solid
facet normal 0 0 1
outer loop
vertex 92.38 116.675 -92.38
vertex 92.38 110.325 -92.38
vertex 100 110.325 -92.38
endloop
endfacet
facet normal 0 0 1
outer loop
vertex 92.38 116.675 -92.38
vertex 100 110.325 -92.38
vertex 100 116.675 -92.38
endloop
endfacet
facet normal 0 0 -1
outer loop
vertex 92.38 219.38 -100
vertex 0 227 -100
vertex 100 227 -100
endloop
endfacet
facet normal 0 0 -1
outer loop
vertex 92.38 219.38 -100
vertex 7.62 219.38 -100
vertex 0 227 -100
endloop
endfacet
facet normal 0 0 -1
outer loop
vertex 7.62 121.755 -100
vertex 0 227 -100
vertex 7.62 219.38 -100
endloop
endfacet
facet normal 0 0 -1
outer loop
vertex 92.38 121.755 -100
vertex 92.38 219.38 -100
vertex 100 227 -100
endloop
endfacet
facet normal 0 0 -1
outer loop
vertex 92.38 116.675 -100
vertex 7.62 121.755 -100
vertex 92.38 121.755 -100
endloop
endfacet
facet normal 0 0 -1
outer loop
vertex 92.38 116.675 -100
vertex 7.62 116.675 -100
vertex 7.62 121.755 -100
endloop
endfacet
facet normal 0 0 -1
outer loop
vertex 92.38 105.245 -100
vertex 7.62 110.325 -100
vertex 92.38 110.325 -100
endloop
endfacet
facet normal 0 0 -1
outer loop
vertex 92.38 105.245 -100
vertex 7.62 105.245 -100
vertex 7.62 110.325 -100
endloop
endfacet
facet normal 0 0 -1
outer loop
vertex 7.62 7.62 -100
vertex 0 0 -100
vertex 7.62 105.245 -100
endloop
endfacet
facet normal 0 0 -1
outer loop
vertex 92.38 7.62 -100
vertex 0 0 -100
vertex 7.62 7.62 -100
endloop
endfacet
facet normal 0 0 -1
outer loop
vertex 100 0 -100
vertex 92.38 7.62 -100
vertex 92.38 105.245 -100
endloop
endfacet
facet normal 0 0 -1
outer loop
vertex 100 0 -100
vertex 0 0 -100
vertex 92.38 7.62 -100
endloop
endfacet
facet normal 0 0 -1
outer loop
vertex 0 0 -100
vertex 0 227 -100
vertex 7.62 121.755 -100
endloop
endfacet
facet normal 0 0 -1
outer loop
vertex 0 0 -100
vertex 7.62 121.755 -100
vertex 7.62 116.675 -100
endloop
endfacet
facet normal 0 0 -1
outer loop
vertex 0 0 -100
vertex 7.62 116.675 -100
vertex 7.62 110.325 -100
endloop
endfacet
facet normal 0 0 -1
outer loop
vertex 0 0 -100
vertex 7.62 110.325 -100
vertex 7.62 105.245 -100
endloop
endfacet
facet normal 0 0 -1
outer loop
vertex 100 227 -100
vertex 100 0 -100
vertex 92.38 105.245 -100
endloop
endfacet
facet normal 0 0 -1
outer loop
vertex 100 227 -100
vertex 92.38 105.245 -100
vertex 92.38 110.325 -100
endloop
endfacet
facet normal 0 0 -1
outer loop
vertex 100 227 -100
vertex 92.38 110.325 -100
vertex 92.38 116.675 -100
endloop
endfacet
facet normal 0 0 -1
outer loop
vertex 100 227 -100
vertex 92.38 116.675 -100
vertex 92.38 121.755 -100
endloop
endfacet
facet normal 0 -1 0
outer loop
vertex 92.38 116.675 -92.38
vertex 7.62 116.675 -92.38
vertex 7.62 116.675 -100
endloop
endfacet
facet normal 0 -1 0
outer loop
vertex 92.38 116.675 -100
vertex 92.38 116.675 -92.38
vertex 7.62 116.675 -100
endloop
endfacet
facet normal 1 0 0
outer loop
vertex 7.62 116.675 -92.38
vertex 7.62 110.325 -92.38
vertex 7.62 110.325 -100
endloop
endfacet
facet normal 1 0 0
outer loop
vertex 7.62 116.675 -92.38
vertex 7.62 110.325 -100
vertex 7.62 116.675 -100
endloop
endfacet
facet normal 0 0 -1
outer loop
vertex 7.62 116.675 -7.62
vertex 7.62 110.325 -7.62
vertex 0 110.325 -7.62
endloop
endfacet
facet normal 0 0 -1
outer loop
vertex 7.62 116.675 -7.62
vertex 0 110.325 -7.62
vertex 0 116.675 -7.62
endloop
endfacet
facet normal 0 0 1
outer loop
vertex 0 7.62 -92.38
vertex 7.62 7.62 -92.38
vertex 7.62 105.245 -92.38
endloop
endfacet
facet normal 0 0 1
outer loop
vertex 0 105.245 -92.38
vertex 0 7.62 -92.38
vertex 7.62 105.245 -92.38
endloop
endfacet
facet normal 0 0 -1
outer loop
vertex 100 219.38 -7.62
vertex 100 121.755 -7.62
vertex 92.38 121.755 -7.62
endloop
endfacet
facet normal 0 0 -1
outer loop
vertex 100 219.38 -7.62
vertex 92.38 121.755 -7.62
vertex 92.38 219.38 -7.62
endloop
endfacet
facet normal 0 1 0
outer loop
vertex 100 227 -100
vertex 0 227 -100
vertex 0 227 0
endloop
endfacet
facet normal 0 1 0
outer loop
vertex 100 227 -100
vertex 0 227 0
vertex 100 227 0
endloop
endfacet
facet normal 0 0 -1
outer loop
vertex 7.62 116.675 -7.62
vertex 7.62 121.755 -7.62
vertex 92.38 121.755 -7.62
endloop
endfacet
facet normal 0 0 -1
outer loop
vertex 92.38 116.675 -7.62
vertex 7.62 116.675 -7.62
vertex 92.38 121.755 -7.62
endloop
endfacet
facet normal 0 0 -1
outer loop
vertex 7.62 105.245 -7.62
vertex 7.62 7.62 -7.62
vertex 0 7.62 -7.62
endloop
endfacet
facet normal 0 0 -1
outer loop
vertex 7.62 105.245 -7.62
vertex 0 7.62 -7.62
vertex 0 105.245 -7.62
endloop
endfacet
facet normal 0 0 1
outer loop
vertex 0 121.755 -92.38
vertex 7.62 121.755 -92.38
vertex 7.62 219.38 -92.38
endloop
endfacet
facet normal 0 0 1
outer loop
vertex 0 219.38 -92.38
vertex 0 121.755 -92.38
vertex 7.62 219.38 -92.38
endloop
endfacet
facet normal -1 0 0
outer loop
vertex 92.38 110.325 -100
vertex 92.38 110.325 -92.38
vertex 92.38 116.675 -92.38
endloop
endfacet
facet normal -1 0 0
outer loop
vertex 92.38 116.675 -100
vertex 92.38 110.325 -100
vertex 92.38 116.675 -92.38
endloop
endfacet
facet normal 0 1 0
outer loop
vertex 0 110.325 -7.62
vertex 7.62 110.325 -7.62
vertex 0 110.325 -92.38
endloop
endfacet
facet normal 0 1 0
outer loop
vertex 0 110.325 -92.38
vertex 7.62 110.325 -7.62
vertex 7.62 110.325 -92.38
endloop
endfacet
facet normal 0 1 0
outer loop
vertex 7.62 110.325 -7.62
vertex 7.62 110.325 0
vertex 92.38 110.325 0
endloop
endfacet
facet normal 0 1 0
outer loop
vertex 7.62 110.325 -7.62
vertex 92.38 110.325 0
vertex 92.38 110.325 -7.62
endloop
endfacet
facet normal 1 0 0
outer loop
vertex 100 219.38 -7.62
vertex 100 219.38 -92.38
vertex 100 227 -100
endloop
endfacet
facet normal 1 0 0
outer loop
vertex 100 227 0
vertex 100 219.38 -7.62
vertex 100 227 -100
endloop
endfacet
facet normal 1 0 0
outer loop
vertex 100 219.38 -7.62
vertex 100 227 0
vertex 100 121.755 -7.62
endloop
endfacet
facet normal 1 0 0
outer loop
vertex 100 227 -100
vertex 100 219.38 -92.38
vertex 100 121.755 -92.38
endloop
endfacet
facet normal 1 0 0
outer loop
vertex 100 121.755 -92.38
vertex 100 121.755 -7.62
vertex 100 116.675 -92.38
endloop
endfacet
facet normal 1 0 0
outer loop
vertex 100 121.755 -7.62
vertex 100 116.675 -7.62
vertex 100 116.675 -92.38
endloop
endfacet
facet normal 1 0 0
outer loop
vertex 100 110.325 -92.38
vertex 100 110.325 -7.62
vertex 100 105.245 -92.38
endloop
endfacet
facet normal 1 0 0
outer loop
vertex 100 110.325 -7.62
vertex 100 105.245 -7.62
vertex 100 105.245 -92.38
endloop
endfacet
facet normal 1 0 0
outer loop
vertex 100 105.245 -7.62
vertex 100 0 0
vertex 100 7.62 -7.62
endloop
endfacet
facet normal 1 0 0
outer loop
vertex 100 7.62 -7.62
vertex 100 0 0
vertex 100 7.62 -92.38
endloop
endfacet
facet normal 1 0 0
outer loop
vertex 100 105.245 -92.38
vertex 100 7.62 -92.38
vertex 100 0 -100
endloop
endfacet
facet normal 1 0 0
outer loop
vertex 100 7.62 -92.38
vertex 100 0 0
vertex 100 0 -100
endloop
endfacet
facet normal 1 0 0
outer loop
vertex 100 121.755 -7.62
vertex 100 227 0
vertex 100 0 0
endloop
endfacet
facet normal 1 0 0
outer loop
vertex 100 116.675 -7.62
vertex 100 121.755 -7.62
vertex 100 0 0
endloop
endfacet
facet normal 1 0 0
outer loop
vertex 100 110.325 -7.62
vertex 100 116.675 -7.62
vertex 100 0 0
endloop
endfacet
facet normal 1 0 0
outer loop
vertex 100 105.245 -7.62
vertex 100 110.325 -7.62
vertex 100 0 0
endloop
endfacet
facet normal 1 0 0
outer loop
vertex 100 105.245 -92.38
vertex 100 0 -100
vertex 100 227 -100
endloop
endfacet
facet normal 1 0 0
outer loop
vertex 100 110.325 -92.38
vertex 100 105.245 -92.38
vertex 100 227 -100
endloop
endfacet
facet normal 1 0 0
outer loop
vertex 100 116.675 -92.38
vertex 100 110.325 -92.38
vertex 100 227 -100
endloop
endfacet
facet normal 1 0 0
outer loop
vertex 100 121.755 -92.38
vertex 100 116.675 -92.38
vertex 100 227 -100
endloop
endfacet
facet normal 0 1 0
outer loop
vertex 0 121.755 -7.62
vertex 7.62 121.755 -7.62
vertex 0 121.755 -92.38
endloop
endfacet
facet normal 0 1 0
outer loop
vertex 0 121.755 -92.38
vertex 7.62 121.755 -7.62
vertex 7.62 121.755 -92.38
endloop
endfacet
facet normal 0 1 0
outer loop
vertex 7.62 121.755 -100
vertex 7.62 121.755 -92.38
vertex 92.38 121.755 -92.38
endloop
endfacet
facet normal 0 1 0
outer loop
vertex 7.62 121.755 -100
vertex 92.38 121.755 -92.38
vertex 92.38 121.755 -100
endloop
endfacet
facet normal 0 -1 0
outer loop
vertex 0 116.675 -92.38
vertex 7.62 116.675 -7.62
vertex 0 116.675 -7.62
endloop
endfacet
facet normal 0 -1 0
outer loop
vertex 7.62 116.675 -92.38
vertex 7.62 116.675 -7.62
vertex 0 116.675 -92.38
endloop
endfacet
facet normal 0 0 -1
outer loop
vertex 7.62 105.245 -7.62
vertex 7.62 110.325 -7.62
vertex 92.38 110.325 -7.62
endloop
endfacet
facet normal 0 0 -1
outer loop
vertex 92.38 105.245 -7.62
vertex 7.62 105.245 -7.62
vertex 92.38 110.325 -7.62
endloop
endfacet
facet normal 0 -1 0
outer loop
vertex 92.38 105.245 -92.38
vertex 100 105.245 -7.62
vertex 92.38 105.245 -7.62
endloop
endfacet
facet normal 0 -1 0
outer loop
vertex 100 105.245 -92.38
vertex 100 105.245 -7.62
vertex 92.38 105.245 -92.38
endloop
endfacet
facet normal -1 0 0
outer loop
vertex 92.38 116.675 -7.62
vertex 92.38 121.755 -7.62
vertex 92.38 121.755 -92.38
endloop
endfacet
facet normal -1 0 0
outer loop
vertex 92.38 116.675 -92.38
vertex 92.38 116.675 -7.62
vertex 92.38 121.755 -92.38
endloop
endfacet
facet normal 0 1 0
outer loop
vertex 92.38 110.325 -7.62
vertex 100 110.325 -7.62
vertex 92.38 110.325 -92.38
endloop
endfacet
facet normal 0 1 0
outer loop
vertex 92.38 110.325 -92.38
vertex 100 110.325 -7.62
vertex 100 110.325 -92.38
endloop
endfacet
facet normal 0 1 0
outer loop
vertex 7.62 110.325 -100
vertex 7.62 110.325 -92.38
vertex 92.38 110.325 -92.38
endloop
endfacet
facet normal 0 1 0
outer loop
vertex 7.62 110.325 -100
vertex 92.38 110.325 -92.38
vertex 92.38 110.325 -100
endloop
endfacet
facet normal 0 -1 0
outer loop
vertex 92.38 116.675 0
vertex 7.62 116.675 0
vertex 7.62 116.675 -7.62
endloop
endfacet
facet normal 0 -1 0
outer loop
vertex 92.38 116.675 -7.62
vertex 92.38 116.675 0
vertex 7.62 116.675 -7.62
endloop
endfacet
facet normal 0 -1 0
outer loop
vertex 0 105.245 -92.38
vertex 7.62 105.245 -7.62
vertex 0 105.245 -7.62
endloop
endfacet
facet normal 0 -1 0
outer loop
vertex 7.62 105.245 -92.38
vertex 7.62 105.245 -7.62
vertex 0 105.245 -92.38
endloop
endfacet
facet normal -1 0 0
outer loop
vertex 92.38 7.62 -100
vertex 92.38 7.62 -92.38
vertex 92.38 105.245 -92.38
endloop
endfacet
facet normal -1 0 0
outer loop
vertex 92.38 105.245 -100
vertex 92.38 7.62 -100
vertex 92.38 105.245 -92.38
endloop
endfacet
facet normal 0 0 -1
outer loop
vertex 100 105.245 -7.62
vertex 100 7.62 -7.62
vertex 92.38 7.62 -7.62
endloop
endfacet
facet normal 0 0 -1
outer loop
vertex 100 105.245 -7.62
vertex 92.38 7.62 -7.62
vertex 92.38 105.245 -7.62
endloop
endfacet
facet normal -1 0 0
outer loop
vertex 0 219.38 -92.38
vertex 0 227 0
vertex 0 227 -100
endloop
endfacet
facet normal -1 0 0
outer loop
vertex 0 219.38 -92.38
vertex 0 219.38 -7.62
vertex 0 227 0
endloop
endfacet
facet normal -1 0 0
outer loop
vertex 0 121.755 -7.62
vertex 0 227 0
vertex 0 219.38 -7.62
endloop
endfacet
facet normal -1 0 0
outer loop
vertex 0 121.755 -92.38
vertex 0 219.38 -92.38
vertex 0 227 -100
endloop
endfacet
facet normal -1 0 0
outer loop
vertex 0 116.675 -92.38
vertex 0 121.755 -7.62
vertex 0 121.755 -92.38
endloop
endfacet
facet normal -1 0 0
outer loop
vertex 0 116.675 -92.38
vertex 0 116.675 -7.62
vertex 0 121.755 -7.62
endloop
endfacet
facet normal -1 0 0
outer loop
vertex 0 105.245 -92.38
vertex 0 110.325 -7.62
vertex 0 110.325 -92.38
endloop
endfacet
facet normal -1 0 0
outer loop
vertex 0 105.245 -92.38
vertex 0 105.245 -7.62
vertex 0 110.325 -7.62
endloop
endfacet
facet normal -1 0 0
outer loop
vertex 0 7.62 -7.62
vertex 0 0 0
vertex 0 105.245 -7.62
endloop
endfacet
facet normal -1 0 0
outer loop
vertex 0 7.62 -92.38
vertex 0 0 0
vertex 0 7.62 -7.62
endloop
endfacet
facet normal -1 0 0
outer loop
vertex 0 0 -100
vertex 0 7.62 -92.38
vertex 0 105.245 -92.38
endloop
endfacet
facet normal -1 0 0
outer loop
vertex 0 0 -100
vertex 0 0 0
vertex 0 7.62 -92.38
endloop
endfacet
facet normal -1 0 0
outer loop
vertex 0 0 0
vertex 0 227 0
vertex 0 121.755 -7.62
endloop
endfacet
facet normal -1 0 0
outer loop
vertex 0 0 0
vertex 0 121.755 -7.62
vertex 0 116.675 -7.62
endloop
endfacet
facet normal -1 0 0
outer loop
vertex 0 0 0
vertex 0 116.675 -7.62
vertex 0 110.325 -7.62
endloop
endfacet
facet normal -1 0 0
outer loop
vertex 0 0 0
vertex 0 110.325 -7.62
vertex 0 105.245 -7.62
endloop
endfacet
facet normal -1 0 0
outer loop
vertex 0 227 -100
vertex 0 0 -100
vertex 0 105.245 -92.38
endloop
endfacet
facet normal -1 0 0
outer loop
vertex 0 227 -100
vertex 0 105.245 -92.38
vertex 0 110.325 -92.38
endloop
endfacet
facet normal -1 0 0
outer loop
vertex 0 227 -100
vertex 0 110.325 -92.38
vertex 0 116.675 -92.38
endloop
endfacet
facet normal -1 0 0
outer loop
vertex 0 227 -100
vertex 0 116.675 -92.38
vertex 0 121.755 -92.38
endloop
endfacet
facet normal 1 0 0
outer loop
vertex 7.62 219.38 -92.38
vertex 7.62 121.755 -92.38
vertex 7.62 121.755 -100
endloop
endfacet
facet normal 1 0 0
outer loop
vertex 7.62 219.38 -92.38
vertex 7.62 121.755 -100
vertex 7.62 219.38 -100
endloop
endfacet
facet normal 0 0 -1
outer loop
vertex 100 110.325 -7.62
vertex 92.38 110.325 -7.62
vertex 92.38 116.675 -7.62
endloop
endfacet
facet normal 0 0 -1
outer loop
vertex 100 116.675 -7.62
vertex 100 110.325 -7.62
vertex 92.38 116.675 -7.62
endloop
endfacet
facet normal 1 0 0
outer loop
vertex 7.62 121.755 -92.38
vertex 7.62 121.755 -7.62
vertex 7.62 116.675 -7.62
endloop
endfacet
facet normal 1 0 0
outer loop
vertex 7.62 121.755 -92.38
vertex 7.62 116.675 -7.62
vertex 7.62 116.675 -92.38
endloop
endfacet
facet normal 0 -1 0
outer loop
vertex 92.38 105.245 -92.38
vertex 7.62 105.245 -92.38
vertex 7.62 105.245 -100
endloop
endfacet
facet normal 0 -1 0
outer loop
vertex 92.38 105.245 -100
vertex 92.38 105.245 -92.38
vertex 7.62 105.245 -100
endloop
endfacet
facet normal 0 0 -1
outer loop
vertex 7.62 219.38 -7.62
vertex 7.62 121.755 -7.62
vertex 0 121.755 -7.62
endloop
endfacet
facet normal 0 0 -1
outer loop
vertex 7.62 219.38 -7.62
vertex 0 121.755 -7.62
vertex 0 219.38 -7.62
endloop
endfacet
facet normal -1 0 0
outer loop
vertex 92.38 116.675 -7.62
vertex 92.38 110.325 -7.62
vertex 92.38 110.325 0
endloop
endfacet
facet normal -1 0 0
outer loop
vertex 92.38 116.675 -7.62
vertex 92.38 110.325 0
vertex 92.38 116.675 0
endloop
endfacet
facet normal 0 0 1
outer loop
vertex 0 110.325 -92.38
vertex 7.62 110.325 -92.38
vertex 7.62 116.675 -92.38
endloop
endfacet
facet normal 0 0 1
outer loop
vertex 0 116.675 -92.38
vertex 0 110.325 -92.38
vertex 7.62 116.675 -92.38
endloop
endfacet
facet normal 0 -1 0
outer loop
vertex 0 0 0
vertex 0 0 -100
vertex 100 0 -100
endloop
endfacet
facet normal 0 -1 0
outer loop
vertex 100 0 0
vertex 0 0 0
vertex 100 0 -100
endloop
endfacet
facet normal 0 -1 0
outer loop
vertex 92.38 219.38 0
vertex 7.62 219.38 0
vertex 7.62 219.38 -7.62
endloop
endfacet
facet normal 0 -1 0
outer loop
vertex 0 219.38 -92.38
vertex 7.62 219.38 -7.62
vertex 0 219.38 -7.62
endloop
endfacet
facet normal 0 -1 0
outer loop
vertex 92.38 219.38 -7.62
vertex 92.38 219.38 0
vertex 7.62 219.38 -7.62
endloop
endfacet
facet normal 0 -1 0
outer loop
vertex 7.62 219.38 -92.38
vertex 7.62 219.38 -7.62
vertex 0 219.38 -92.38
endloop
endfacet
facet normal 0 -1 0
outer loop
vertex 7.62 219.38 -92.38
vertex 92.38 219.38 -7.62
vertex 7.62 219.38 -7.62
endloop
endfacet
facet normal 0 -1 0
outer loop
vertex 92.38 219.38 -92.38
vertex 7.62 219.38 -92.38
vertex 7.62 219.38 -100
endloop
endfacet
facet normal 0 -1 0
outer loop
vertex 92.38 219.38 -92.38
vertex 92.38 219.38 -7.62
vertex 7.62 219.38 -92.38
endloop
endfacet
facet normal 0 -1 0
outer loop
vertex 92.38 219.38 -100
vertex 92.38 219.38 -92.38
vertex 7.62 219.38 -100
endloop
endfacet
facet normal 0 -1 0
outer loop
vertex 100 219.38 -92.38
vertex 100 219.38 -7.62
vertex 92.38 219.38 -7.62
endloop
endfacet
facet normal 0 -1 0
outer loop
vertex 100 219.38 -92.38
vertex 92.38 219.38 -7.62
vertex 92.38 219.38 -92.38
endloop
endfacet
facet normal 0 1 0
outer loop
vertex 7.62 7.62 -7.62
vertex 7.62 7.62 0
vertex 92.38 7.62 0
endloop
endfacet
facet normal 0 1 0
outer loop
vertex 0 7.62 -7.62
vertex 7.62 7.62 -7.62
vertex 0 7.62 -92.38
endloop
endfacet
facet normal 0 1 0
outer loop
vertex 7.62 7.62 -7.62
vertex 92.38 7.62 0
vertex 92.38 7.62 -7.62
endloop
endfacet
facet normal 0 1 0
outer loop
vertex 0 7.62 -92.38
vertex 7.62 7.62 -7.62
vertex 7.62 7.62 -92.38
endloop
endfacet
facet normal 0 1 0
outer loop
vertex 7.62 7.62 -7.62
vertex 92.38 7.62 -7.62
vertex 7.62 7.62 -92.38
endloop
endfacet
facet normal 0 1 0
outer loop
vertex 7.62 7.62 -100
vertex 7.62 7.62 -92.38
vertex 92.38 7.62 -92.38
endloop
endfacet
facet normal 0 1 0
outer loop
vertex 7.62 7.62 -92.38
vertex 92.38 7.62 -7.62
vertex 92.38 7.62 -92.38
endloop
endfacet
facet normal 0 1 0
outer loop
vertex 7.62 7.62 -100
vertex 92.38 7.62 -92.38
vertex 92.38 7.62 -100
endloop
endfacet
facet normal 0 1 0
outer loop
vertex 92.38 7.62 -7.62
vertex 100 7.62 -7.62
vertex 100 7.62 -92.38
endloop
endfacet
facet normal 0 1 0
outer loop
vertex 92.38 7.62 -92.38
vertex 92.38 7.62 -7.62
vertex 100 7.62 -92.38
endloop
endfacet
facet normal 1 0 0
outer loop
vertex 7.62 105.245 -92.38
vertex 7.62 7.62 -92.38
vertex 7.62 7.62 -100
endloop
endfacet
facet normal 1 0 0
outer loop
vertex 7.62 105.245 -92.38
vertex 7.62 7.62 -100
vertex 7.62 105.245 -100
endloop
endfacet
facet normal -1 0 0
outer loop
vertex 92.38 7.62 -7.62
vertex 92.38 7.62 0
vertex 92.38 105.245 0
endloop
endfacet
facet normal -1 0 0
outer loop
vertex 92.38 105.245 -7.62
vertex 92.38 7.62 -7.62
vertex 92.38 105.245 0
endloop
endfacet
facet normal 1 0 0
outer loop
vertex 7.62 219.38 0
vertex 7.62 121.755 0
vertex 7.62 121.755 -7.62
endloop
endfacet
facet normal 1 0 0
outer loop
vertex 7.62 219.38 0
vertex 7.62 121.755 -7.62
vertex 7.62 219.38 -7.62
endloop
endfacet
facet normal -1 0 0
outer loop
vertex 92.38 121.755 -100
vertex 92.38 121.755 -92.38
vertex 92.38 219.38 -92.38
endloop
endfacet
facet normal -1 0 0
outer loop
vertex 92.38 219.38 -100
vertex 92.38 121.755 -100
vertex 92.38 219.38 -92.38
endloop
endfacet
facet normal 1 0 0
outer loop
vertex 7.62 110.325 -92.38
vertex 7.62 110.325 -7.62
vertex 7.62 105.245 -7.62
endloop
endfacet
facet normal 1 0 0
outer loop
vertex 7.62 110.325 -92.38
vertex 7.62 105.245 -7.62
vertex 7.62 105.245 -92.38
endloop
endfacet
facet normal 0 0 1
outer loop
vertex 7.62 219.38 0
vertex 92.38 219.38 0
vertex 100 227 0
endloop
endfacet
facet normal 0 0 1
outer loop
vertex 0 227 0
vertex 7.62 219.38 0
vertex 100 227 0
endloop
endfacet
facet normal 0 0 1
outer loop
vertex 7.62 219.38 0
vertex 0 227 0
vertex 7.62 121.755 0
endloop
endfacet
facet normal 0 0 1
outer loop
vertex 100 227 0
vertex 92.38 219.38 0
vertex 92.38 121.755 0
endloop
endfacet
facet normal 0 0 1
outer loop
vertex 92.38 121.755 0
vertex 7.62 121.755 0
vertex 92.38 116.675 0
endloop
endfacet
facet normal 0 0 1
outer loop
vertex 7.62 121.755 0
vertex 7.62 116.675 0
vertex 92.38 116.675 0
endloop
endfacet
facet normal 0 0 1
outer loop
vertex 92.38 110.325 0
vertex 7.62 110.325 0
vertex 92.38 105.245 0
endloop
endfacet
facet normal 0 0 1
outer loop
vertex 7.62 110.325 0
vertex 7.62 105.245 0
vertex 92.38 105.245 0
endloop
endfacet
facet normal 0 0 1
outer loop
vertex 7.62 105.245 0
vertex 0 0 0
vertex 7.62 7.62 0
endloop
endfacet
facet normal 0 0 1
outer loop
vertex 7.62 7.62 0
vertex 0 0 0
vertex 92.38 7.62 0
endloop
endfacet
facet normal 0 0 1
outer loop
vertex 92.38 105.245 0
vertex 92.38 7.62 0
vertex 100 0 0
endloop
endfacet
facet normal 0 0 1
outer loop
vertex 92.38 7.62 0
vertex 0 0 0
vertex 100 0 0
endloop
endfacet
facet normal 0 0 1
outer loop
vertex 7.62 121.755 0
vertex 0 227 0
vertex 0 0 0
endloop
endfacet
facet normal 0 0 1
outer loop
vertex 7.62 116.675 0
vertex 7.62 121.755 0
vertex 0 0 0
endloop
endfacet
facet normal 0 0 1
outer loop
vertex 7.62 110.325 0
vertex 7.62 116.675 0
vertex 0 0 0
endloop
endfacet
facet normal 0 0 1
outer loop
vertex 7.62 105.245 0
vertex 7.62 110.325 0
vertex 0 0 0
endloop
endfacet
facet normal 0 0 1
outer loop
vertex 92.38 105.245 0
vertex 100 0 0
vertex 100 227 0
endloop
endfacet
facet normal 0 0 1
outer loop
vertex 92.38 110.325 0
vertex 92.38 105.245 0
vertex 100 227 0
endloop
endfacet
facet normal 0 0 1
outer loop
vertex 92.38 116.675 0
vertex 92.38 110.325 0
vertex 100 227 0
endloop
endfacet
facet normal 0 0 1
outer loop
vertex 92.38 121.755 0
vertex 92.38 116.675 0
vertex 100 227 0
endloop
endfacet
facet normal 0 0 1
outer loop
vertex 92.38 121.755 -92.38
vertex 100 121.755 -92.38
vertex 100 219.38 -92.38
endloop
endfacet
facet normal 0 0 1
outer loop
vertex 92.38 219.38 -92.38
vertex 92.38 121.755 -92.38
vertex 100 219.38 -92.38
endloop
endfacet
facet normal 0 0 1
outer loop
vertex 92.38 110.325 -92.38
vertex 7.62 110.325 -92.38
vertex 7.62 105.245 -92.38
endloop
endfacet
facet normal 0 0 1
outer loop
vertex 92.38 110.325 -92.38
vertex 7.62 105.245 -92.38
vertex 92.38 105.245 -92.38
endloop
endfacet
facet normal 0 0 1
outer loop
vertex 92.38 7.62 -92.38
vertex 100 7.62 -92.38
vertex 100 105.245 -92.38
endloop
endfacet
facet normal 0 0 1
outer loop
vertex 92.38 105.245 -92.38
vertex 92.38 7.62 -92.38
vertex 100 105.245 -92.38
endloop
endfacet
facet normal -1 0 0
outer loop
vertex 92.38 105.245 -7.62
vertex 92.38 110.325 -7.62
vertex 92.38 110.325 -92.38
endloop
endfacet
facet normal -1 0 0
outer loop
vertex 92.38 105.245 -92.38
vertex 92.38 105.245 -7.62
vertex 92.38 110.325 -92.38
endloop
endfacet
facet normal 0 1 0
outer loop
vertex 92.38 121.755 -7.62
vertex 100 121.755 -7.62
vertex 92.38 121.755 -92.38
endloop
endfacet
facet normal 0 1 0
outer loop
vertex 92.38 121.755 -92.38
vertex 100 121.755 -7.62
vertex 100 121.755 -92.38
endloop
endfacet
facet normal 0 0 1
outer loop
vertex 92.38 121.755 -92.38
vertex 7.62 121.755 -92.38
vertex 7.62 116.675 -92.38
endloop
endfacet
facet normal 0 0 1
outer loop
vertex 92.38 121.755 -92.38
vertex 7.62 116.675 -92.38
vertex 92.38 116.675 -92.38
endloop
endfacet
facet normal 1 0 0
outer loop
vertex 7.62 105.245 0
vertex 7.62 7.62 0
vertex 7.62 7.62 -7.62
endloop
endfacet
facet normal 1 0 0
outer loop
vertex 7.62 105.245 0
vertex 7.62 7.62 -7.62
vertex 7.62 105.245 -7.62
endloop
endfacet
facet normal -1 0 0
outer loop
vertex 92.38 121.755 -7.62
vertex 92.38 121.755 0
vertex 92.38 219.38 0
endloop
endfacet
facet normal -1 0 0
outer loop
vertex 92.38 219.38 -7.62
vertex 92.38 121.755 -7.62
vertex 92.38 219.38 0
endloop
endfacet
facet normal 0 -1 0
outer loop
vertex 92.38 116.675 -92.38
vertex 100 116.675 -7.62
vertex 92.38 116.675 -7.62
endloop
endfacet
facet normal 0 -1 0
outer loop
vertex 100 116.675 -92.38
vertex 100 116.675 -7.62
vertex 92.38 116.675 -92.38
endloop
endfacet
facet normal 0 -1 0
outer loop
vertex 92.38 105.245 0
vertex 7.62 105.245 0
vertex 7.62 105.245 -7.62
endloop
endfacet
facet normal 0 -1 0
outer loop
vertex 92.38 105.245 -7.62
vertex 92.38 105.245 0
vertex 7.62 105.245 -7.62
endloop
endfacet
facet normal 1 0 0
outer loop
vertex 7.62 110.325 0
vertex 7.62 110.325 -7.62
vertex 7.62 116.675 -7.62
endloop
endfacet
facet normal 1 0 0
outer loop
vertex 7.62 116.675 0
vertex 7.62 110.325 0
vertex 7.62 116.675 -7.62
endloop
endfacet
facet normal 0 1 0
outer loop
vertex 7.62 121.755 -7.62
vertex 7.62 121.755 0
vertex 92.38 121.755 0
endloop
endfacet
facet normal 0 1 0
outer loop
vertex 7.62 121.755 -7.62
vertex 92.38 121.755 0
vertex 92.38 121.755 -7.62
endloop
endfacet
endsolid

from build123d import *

# Parameters (mm, degrees)
SKETCH1_W           = 100
SKETCH1_H           = 100
BOSS_EXTRUDE1_DEPTH = 227
SKETCH6_W           = 84.76
SKETCH6_H           = 97.625
SKETCH6_H_2         = 6.35
CUT_EXTRUDE3_DEPTH  = 268.44906057
SKETCH10_W          = 84.76
SKETCH10_H          = 97.625
SKETCH10_H_2        = 6.35
CUT_EXTRUDE4_DEPTH  = 268.44906057
SKETCH11_W          = 84.76
SKETCH11_H          = 84.76
CUT_EXTRUDE5_DEPTH  = 25.4


with BuildPart() as part:
    # Sketch1 → Boss-Extrude1 (new body)
    with BuildSketch(Plane(origin=(0, 0, 0), x_dir=(1, 0, 0), z_dir=(0, 1, 0))):
        with Locations((50, 50)):
            Rectangle(SKETCH1_W, SKETCH1_H)
    extrude(amount=BOSS_EXTRUDE1_DEPTH)

    # Sketch6 → Cut-Extrude3 (cut, through all)
    with BuildSketch(Plane(origin=(100, 0, 0), x_dir=(0, 0, -1), z_dir=(1, 0, 0))):
        with Locations((50, 56.4325)):
            Rectangle(SKETCH6_W, SKETCH6_H)
        with Locations((50, 113.5)):
            Rectangle(SKETCH6_W, SKETCH6_H_2)
        with Locations((50, 170.5675)):
            Rectangle(SKETCH6_W, SKETCH6_H)
    extrude(amount=-CUT_EXTRUDE3_DEPTH, mode=Mode.SUBTRACT)

    # Sketch10 → Cut-Extrude4 (cut, through all)
    with BuildSketch(Plane.XY):
        with Locations((50, 170.5675)):
            Rectangle(SKETCH10_W, SKETCH10_H)
        with Locations((50, 113.5)):
            Rectangle(SKETCH10_W, SKETCH10_H_2)
        with Locations((50, 56.4325)):
            Rectangle(SKETCH10_W, SKETCH10_H)
    extrude(amount=-CUT_EXTRUDE4_DEPTH, mode=Mode.SUBTRACT)

    # Sketch11 → Cut-Extrude5 (cut)
    with BuildSketch(Plane(origin=(0, 121.755, 0), x_dir=(1, 0, 0), z_dir=(0, 1, 0))):
        with Locations((50, 50)):
            Rectangle(SKETCH11_W, SKETCH11_H)
    extrude(amount=-CUT_EXTRUDE5_DEPTH, mode=Mode.SUBTRACT)


solid = part.part
